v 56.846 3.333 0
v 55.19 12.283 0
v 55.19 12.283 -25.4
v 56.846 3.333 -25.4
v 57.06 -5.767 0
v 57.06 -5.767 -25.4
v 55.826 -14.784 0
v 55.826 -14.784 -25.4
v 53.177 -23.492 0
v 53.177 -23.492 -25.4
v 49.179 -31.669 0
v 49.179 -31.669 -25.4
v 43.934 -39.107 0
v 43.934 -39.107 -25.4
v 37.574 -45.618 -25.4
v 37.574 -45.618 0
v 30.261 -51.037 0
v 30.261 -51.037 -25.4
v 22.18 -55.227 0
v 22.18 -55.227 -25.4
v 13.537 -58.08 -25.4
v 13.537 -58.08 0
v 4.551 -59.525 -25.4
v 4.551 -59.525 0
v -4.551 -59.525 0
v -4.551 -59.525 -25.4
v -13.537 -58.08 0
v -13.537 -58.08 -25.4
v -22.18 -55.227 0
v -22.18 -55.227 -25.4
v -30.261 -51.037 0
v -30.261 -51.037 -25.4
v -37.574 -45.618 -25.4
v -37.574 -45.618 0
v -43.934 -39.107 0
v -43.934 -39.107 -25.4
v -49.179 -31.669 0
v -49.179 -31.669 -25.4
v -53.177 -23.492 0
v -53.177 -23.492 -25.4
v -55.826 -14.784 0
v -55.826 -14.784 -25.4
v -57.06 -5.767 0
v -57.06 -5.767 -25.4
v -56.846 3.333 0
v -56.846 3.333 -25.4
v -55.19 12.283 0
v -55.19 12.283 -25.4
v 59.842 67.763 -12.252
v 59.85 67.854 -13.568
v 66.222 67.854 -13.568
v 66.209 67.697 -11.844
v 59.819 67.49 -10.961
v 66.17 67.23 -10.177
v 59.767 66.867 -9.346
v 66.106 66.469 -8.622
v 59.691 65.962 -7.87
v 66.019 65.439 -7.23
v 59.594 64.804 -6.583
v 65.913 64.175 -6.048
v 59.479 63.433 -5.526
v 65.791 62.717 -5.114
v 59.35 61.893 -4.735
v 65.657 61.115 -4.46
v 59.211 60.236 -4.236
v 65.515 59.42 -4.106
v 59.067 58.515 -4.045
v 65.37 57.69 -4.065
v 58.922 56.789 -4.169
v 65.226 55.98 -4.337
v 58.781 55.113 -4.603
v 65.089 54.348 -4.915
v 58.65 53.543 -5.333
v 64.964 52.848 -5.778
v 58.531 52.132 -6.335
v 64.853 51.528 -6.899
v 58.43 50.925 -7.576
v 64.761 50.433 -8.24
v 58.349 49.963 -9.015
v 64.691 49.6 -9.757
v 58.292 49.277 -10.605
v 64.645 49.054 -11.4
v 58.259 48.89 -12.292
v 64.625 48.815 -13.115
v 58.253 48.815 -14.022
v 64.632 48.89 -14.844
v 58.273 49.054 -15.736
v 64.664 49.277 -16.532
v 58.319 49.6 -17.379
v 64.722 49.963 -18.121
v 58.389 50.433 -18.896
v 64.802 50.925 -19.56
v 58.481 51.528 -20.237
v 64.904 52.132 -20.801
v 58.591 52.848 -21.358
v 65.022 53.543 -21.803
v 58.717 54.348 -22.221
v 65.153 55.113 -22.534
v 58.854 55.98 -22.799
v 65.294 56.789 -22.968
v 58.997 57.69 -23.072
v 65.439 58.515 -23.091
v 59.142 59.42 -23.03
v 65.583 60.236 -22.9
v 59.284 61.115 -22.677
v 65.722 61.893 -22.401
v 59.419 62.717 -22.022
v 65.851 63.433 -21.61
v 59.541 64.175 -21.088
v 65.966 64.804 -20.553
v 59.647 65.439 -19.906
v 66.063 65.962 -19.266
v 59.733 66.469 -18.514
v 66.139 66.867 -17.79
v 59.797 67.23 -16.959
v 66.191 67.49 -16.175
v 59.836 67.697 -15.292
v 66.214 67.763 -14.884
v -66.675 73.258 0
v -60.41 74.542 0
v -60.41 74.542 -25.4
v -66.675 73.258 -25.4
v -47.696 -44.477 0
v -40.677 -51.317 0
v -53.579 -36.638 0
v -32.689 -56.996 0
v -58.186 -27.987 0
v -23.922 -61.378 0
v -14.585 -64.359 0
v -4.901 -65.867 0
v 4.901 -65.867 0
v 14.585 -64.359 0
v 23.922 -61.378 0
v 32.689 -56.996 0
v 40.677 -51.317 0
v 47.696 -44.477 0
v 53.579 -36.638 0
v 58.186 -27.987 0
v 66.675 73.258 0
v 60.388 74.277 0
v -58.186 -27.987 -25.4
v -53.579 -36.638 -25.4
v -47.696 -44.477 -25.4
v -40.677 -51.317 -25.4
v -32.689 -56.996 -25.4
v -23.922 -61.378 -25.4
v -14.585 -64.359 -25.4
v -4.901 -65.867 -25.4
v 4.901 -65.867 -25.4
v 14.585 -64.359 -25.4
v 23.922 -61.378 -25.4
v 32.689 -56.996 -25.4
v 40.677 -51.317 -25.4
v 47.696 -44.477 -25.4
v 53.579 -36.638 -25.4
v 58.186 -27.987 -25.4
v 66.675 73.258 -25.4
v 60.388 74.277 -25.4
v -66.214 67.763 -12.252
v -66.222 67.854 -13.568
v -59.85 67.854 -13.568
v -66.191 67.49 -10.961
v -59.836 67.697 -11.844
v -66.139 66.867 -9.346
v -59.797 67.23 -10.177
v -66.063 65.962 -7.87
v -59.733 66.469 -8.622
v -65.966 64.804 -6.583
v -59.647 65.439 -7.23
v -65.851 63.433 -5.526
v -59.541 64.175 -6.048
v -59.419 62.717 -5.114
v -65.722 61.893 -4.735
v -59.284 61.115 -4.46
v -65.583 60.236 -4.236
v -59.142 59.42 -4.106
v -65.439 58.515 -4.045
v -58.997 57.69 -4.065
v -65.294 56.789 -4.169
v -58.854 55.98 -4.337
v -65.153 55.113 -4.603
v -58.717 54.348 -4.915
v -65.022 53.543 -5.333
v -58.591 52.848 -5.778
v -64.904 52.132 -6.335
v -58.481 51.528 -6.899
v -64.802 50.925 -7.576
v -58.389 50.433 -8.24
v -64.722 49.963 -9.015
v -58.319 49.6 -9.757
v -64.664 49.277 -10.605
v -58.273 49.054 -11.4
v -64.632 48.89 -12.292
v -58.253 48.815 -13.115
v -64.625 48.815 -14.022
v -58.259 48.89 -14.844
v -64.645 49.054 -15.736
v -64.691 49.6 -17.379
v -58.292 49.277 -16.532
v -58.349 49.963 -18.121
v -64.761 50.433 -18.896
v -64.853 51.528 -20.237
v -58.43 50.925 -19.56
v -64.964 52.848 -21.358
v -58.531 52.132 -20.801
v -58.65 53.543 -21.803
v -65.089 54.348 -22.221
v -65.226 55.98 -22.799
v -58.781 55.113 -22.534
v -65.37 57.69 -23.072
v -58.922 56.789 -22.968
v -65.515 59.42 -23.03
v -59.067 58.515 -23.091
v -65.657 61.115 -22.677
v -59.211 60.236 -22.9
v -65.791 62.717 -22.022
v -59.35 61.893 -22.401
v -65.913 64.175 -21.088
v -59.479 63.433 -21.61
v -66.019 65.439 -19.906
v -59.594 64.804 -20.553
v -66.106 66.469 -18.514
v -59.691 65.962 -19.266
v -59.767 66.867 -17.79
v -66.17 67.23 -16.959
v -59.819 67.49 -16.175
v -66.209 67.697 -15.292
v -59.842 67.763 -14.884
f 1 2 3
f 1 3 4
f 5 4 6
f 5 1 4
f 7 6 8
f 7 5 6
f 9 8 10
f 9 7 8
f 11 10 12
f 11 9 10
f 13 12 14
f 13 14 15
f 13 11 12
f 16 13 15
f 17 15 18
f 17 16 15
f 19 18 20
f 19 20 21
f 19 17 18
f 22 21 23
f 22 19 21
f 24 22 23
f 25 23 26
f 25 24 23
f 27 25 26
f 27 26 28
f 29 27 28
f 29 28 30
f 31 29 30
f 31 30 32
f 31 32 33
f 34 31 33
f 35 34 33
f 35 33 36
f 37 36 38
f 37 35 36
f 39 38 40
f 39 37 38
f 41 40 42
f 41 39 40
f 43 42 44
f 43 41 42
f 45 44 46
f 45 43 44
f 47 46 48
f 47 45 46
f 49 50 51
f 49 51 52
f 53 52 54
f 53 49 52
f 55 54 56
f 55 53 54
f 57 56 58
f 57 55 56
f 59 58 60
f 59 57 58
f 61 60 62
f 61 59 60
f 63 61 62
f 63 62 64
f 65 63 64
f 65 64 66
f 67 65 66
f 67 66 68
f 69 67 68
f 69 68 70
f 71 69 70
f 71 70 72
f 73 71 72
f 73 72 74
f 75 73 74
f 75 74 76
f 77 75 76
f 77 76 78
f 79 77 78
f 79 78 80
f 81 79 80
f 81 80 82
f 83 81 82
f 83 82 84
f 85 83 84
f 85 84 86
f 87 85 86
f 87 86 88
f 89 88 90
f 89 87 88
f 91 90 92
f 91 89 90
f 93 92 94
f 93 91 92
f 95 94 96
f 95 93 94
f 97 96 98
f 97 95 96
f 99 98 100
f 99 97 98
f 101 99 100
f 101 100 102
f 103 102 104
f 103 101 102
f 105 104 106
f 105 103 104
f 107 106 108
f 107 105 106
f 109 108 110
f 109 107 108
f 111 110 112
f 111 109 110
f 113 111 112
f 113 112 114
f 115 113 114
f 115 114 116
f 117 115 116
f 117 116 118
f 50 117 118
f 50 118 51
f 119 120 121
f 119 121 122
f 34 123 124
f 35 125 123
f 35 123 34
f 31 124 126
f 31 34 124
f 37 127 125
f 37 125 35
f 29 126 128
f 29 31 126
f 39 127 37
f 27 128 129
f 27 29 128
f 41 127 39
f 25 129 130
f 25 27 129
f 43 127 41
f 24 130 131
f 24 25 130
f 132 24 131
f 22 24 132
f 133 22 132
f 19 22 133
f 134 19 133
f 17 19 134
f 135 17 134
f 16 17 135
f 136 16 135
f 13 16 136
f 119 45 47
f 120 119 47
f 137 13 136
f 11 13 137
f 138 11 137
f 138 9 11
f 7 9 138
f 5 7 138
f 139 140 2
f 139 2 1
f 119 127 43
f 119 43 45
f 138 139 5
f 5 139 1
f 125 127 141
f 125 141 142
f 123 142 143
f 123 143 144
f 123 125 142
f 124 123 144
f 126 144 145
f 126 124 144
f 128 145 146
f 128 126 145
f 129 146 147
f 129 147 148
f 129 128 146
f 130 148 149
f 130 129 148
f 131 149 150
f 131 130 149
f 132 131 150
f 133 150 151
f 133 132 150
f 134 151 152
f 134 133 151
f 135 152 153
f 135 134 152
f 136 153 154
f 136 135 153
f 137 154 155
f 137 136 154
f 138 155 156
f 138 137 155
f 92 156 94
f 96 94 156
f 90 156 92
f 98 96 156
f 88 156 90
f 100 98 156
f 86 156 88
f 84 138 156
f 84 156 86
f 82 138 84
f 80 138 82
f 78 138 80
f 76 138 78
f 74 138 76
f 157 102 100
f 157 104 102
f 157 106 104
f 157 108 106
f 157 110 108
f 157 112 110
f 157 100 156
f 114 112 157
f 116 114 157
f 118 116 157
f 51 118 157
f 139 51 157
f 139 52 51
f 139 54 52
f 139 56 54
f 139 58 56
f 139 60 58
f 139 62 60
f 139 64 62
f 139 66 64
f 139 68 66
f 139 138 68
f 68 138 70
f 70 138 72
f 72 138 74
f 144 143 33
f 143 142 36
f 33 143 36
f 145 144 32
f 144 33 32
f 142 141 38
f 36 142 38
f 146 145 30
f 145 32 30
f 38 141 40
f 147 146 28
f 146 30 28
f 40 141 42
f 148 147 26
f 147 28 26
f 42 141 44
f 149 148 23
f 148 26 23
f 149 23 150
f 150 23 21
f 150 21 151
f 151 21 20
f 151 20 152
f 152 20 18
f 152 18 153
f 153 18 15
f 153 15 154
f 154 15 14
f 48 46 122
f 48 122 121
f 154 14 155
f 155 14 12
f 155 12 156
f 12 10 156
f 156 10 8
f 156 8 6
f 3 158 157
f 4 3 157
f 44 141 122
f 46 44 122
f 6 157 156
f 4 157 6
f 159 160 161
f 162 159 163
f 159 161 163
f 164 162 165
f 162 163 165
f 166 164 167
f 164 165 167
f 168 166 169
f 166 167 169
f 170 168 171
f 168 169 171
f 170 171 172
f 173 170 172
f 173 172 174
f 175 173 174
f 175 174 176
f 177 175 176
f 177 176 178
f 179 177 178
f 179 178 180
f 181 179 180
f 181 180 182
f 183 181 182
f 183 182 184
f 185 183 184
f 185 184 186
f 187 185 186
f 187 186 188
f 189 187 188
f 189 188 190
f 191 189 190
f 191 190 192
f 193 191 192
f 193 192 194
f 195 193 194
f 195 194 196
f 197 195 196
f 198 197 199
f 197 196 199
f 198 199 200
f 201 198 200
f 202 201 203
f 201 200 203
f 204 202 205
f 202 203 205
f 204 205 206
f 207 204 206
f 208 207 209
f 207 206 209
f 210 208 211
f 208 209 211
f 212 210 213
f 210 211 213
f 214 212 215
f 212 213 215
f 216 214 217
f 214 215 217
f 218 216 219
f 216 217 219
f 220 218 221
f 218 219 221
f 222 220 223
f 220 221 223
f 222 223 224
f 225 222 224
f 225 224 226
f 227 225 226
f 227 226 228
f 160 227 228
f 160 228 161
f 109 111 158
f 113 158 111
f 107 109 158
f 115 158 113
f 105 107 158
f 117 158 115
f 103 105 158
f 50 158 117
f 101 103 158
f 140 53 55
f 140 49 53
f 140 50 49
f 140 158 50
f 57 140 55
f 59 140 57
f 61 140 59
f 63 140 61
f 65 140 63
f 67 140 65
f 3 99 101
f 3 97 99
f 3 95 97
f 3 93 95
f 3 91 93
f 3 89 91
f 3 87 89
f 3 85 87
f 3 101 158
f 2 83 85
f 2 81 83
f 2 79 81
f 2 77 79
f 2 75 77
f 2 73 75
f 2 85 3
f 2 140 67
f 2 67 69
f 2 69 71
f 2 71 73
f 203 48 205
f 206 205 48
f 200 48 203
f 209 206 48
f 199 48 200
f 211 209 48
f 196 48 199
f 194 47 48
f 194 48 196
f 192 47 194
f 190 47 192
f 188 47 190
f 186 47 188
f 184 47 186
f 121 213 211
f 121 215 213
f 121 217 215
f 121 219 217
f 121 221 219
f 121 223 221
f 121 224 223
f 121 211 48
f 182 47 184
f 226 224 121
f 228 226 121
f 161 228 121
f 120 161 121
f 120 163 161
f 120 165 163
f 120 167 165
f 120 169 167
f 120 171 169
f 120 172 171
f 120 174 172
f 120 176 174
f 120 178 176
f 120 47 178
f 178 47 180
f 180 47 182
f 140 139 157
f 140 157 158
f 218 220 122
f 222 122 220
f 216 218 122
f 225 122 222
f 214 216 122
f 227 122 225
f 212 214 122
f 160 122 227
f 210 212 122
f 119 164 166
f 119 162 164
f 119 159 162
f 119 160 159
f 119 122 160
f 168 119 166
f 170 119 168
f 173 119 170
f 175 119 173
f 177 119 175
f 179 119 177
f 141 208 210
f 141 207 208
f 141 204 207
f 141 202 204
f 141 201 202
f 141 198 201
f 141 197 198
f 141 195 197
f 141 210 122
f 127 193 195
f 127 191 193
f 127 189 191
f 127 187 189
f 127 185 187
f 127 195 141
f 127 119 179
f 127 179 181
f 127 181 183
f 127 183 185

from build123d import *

# Parameters (mm, degrees)
F1_DEPTH = 25.4
F2_R     = 9.525
F3_DEPTH = 66.676
F4_DEPTH = 66.676


with BuildPart() as f1:
    # F0 (on Top) → F1 (new body)
    with BuildSketch(Plane.XY):
        with BuildLine():
            Line((-60.410346, 74.541754), (-66.675, 73.258158))
            Line((-66.675, 73.258158), (-58.185558, -27.986543))
            ThreePointArc((-58.185558, -27.986543), (0, -66.056425), (58.185558, -27.986543))
            Line((58.185558, -27.986543), (66.675, 73.258158))
            Line((66.675, 73.258158), (60.388141, 74.276935))
            Line((60.388141, 74.276935), (55.189879, 12.282703))
            ThreePointArc((55.189879, 12.282703), (0, -59.706425), (-55.189879, 12.282703))
            Line((-55.189879, 12.282703), (-60.410346, 74.541754))
        make_face()
    extrude(amount=-F1_DEPTH)

    # F2 (on Right) → F3 (cut, through all)
    with BuildSketch(Plane.YZ):
        with Locations((58.328964, -13.568129)):
            Circle(F2_R)
    extrude(amount=F3_DEPTH, mode=Mode.SUBTRACT)

    # F2 (on Right) → F4 (cut, through all)
    with BuildSketch(Plane.YZ):
        with Locations((58.328964, -13.568129)):
            Circle(F2_R)
    extrude(amount=-F4_DEPTH, mode=Mode.SUBTRACT)


solid = f1.part
